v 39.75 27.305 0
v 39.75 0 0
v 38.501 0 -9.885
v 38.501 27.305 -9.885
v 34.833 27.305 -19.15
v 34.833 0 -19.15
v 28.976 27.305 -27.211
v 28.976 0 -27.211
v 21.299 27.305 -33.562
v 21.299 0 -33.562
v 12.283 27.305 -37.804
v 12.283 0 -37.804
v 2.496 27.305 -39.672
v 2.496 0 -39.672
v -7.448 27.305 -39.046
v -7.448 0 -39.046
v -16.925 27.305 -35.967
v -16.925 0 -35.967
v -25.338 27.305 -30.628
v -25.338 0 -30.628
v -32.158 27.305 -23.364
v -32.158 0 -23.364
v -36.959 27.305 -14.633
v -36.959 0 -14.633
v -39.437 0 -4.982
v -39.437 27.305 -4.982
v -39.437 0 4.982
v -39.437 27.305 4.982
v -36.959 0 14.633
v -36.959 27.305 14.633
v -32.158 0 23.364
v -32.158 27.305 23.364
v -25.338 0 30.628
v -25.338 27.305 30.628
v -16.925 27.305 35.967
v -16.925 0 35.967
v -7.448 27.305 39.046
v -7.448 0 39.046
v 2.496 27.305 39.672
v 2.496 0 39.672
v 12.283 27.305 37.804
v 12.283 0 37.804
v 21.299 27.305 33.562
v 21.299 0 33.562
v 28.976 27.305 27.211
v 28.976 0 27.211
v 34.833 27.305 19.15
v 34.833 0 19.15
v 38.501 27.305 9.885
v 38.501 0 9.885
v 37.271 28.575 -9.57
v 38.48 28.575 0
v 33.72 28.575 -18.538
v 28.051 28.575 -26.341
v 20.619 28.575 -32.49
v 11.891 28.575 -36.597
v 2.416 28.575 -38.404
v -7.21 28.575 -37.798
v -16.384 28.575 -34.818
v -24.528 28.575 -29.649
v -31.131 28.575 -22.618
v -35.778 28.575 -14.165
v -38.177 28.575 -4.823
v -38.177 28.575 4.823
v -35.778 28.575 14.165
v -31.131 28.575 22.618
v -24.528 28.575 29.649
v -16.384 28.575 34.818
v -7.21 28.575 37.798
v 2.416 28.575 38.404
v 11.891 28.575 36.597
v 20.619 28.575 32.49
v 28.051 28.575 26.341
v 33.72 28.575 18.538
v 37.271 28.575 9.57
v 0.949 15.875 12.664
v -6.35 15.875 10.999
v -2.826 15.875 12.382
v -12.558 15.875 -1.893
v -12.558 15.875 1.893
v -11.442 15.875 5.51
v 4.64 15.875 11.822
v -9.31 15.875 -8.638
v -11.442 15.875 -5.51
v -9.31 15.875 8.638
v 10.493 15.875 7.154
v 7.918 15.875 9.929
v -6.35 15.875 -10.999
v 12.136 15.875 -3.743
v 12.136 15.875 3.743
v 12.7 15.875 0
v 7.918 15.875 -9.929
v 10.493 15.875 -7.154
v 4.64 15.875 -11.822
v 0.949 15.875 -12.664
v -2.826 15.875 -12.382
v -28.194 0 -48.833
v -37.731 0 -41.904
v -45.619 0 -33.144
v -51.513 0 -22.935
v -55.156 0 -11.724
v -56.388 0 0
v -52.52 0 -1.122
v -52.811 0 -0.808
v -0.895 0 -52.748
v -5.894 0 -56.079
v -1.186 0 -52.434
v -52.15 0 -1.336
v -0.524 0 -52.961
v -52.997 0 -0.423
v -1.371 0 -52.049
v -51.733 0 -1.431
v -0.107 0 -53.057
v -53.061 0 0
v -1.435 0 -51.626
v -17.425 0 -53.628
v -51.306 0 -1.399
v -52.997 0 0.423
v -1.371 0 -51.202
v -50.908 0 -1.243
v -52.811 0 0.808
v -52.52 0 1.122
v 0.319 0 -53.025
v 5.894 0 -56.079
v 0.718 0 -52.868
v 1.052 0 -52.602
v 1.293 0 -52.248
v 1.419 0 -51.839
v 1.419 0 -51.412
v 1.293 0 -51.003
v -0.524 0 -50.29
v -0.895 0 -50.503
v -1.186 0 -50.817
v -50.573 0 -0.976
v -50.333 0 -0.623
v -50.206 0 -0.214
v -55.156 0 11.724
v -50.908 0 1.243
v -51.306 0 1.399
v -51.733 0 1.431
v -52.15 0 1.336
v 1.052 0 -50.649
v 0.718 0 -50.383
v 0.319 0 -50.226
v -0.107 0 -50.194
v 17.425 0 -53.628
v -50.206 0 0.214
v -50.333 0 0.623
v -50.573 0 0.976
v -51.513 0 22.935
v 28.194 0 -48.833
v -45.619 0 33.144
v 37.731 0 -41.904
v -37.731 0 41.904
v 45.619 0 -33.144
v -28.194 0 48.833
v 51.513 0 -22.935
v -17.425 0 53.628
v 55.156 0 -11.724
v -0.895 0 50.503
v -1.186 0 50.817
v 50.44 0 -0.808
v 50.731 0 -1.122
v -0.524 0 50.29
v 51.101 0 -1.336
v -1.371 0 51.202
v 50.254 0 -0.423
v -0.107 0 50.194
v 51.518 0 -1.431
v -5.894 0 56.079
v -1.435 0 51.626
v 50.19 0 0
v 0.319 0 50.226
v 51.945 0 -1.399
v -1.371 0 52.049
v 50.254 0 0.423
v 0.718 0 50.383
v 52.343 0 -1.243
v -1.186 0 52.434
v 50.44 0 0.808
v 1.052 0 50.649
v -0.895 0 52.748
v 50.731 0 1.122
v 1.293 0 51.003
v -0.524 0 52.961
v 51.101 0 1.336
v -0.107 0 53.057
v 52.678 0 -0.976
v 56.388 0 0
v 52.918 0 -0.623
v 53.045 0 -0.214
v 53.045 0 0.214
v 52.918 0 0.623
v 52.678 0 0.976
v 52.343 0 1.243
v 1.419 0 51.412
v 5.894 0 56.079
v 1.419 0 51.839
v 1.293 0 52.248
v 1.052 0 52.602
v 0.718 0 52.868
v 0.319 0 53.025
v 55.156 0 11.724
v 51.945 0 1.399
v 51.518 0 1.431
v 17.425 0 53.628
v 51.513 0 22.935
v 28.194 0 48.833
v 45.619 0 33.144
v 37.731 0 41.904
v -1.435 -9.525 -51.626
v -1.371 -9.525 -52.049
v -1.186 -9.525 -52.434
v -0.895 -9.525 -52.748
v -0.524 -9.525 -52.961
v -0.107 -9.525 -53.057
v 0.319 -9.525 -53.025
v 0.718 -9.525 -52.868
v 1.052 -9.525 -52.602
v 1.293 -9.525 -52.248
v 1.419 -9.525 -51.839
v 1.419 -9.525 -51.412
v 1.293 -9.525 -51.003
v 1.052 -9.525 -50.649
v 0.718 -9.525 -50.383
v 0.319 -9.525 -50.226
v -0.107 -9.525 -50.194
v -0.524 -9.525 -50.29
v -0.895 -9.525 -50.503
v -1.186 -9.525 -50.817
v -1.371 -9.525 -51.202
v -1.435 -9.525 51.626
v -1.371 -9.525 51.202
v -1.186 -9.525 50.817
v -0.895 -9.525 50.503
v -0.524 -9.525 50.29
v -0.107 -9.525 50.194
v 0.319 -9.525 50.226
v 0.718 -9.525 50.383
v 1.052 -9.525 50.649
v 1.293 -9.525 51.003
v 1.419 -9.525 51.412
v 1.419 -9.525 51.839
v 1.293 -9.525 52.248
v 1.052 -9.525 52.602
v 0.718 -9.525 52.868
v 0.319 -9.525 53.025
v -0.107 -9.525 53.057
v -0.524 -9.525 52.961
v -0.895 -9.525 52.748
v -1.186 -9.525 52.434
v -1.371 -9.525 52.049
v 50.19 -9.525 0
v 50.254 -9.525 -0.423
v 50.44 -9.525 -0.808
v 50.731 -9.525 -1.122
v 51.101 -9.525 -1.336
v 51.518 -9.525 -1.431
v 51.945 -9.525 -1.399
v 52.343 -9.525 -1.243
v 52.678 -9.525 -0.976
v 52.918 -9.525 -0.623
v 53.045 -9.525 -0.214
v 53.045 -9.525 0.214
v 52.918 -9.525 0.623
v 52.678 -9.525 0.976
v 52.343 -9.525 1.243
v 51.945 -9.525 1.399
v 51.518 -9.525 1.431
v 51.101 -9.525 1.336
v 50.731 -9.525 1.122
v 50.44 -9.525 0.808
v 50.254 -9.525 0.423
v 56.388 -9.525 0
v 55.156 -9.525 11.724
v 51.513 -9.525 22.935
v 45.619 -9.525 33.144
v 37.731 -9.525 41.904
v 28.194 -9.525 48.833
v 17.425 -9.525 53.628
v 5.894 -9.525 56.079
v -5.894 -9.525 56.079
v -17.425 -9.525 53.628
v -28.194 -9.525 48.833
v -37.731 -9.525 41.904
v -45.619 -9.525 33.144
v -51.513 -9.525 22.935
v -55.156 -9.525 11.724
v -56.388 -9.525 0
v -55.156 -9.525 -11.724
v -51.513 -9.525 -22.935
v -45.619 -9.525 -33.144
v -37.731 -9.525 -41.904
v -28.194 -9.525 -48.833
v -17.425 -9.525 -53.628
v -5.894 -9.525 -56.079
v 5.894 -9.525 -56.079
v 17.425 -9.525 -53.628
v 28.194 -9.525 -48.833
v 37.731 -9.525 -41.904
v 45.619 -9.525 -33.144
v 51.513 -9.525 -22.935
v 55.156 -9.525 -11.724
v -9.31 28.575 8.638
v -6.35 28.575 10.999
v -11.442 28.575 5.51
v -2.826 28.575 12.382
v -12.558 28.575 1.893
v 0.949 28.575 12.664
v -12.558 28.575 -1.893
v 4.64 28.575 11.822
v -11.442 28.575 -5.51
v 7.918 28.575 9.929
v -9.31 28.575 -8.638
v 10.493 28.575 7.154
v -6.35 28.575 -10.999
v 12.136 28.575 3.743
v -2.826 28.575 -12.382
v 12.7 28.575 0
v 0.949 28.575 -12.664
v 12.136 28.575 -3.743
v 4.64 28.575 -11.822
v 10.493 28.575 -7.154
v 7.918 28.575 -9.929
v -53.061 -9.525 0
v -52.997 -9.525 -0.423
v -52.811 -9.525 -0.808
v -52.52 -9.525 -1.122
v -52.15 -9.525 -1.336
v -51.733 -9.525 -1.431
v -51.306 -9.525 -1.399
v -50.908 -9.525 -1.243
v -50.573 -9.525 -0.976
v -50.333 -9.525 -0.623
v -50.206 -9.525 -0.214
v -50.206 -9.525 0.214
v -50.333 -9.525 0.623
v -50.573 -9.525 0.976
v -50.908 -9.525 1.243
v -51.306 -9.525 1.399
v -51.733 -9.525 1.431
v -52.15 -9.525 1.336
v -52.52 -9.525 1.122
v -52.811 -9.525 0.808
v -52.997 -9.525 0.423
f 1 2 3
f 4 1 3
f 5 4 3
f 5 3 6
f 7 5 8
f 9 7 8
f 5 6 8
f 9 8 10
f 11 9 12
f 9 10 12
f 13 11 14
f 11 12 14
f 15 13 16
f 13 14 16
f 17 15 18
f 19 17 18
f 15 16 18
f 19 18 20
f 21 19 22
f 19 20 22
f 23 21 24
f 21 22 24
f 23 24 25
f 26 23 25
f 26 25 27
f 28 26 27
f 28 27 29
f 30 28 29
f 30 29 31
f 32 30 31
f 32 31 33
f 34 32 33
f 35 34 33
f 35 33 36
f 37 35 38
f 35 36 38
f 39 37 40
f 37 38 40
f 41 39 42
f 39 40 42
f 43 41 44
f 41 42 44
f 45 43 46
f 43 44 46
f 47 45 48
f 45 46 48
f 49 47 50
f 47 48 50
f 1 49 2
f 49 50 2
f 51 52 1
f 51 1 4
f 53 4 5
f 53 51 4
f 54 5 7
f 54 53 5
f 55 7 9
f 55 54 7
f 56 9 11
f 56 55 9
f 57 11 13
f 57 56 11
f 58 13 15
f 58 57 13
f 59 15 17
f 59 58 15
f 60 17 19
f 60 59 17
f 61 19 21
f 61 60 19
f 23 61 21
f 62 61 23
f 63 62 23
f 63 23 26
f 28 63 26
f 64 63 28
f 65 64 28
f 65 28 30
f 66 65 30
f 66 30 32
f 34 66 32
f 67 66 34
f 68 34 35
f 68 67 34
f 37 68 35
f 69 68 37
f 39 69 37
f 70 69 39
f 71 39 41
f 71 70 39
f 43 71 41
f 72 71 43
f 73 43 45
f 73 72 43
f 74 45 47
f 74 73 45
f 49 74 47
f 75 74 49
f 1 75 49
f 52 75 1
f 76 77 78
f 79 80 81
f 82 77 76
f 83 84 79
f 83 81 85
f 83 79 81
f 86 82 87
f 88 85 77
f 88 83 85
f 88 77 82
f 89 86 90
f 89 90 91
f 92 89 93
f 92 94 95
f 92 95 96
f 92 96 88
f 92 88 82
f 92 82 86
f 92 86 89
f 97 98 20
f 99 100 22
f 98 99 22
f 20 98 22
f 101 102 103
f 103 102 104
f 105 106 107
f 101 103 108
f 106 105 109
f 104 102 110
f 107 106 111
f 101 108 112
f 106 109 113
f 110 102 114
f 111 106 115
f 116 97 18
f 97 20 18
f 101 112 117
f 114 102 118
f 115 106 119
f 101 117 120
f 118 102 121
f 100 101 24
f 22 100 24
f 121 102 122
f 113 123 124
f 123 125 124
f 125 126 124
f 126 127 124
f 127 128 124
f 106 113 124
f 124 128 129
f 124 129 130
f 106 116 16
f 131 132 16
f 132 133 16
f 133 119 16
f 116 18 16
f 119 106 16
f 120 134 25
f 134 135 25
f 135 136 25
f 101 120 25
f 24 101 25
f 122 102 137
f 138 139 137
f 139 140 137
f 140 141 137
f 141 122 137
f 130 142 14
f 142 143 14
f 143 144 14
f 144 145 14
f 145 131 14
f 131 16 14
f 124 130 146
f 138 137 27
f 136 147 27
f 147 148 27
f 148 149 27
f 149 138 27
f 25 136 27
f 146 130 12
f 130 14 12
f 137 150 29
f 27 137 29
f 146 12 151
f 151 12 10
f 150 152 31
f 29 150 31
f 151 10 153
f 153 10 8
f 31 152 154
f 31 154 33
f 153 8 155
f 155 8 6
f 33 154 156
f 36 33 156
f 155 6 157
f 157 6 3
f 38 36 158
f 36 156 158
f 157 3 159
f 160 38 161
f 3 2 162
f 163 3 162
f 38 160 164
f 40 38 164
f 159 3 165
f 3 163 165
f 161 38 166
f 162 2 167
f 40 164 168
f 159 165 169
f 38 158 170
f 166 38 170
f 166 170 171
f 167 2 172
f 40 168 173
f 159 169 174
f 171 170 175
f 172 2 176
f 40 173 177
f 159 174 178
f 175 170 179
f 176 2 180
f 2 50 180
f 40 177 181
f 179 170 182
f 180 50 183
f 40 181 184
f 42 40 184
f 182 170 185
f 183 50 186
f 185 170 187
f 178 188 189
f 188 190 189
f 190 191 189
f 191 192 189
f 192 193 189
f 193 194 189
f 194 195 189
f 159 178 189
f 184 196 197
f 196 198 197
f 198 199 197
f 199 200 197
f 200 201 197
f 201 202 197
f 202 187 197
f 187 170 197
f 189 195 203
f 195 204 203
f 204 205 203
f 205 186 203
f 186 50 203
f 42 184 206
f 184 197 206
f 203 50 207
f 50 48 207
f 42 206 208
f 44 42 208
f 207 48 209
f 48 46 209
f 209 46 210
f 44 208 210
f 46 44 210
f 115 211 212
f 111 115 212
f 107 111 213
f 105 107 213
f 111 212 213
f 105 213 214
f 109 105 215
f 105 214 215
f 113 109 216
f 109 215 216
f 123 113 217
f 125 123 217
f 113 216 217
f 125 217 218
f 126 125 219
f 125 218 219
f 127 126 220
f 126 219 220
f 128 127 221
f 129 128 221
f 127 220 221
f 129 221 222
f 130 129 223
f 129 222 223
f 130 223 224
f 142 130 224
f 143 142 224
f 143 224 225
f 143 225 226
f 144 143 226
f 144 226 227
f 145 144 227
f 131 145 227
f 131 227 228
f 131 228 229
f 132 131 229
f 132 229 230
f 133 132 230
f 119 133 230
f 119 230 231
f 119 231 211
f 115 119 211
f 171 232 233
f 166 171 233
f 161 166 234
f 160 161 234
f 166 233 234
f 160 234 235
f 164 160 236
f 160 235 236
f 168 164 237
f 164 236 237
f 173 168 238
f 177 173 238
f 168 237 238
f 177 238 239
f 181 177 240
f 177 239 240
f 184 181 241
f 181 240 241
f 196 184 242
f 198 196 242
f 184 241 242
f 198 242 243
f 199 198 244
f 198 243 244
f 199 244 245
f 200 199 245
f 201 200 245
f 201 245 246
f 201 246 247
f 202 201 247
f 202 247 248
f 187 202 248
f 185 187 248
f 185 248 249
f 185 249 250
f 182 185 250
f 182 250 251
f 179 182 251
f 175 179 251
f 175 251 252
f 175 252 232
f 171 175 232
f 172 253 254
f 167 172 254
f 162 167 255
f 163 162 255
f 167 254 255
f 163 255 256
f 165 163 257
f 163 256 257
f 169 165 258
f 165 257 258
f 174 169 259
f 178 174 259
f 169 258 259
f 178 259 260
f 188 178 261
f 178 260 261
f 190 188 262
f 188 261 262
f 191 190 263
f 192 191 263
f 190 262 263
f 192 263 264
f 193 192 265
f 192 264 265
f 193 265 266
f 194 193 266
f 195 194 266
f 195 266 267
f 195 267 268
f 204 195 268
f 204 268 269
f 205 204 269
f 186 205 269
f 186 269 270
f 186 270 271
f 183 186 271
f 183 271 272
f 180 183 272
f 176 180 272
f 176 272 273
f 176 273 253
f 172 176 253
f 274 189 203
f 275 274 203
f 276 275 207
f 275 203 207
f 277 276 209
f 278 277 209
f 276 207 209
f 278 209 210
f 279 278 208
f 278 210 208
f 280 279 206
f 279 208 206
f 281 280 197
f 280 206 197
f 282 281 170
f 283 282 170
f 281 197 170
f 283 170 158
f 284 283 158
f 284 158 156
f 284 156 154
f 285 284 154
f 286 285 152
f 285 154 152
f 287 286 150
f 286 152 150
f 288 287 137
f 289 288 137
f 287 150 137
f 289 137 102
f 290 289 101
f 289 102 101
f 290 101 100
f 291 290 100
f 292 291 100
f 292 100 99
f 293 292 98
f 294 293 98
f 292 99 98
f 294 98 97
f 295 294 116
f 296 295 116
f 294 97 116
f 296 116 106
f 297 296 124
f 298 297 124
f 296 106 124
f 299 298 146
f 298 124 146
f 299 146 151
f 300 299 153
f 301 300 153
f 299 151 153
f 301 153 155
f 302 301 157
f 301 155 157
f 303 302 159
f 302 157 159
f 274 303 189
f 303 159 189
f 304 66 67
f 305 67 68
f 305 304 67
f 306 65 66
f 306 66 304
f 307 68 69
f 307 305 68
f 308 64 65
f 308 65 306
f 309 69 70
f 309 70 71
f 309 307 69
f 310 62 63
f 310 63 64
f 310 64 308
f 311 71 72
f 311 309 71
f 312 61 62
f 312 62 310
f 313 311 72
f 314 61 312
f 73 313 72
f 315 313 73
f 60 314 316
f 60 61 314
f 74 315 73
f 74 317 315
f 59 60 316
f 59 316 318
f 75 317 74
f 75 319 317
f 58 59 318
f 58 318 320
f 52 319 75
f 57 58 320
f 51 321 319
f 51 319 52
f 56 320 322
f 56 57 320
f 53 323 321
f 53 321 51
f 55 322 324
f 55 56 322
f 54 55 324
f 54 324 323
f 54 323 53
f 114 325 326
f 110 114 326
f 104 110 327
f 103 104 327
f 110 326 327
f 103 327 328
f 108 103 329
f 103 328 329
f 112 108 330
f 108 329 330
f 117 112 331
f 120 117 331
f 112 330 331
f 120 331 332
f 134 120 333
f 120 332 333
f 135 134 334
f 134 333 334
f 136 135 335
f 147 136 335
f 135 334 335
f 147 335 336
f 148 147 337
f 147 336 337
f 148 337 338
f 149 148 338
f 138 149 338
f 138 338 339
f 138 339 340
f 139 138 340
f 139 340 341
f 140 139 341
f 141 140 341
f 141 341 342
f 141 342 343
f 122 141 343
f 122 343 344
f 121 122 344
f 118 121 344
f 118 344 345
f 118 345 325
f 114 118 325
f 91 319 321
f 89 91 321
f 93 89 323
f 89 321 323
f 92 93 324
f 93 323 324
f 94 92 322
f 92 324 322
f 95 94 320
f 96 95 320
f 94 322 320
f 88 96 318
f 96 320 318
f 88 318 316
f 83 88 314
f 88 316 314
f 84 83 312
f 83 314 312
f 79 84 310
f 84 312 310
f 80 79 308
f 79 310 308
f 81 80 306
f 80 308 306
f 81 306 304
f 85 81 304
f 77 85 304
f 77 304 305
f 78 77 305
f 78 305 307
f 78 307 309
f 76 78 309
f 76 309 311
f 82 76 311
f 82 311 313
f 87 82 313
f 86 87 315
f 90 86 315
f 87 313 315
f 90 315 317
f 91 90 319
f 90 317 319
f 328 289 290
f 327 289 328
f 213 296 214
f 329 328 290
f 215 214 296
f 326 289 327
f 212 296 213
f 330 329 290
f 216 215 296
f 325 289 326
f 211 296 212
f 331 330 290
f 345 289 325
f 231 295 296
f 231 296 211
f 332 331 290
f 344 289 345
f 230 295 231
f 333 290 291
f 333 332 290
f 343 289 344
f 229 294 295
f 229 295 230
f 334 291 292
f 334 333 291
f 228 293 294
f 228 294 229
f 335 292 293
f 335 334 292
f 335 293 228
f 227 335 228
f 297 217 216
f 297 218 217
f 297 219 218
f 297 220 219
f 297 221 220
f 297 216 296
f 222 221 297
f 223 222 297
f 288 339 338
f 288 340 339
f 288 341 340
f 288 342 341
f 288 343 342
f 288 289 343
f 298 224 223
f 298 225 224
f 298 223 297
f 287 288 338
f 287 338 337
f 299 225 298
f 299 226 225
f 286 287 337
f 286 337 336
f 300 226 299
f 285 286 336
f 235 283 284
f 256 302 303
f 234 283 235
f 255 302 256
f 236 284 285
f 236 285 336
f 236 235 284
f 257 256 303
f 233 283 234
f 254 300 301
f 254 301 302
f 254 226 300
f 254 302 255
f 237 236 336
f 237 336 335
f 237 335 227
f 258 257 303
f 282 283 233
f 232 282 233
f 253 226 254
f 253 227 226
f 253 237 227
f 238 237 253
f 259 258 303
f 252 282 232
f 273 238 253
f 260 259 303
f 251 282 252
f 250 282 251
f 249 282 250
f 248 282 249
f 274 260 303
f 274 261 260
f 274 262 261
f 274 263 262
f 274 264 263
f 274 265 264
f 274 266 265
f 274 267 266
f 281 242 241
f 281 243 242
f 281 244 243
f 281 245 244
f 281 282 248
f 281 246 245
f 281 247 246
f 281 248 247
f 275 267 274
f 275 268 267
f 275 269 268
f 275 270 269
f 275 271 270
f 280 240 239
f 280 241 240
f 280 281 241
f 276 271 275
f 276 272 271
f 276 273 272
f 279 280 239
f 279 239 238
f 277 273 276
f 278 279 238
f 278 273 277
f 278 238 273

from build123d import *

# Parameters (mm, degrees)
SKETCH1_R                 = 39.749984
BOSS_EXTRUDE1_DEPTH       = 28.575
SKETCH3_R                 = 56.388
BOSS_EXTRUDE3_DEPTH       = 9.525
CHAMFER1_SIZE             = 1.27
TAP_DRILL_FOR_4_40_TAP1_D = 2.8702
SKETCH2_R                 = 12.7
CUT_EXTRUDE1_DEPTH        = 12.7


with BuildPart() as part:
    # Sketch1 → Boss-Extrude1 (new body)
    with BuildSketch(Plane(origin=(0, 0, 0), x_dir=(1, 0, 0), z_dir=(0, 1, 0))):
        Circle(SKETCH1_R)
    extrude(amount=BOSS_EXTRUDE1_DEPTH)

    # Sketch3 → Boss-Extrude3 (add)
    with BuildSketch(Plane.XZ):
        Circle(SKETCH3_R)
    extrude(amount=BOSS_EXTRUDE3_DEPTH)

    # Chamfer1
    chamfer1_edges = [part.edges().sort_by_distance(p)[0] for p in [
        (-39.749984, 28.575, 0),
    ]]
    chamfer(chamfer1_edges, length=CHAMFER1_SIZE)

    # Tap Drill for #4-40 Tap1 (through all)
    with Locations(Plane(origin=(0, 0, 0), x_dir=(1, 0, 0), z_dir=(0, 1, 0))):
        with Locations((0, 51.6255), (51.6255, 0), (0, -51.6255), (-51.6255, 0)):
            Hole(TAP_DRILL_FOR_4_40_TAP1_D / 2)

    # Sketch2 → Cut-Extrude1 (cut)
    with BuildSketch(Plane(origin=(0, 28.575, 0), x_dir=(1, 0, 0), z_dir=(0, 1, 0))):
        Circle(SKETCH2_R)
    extrude(amount=-CUT_EXTRUDE1_DEPTH, mode=Mode.SUBTRACT)


solid = part.part
